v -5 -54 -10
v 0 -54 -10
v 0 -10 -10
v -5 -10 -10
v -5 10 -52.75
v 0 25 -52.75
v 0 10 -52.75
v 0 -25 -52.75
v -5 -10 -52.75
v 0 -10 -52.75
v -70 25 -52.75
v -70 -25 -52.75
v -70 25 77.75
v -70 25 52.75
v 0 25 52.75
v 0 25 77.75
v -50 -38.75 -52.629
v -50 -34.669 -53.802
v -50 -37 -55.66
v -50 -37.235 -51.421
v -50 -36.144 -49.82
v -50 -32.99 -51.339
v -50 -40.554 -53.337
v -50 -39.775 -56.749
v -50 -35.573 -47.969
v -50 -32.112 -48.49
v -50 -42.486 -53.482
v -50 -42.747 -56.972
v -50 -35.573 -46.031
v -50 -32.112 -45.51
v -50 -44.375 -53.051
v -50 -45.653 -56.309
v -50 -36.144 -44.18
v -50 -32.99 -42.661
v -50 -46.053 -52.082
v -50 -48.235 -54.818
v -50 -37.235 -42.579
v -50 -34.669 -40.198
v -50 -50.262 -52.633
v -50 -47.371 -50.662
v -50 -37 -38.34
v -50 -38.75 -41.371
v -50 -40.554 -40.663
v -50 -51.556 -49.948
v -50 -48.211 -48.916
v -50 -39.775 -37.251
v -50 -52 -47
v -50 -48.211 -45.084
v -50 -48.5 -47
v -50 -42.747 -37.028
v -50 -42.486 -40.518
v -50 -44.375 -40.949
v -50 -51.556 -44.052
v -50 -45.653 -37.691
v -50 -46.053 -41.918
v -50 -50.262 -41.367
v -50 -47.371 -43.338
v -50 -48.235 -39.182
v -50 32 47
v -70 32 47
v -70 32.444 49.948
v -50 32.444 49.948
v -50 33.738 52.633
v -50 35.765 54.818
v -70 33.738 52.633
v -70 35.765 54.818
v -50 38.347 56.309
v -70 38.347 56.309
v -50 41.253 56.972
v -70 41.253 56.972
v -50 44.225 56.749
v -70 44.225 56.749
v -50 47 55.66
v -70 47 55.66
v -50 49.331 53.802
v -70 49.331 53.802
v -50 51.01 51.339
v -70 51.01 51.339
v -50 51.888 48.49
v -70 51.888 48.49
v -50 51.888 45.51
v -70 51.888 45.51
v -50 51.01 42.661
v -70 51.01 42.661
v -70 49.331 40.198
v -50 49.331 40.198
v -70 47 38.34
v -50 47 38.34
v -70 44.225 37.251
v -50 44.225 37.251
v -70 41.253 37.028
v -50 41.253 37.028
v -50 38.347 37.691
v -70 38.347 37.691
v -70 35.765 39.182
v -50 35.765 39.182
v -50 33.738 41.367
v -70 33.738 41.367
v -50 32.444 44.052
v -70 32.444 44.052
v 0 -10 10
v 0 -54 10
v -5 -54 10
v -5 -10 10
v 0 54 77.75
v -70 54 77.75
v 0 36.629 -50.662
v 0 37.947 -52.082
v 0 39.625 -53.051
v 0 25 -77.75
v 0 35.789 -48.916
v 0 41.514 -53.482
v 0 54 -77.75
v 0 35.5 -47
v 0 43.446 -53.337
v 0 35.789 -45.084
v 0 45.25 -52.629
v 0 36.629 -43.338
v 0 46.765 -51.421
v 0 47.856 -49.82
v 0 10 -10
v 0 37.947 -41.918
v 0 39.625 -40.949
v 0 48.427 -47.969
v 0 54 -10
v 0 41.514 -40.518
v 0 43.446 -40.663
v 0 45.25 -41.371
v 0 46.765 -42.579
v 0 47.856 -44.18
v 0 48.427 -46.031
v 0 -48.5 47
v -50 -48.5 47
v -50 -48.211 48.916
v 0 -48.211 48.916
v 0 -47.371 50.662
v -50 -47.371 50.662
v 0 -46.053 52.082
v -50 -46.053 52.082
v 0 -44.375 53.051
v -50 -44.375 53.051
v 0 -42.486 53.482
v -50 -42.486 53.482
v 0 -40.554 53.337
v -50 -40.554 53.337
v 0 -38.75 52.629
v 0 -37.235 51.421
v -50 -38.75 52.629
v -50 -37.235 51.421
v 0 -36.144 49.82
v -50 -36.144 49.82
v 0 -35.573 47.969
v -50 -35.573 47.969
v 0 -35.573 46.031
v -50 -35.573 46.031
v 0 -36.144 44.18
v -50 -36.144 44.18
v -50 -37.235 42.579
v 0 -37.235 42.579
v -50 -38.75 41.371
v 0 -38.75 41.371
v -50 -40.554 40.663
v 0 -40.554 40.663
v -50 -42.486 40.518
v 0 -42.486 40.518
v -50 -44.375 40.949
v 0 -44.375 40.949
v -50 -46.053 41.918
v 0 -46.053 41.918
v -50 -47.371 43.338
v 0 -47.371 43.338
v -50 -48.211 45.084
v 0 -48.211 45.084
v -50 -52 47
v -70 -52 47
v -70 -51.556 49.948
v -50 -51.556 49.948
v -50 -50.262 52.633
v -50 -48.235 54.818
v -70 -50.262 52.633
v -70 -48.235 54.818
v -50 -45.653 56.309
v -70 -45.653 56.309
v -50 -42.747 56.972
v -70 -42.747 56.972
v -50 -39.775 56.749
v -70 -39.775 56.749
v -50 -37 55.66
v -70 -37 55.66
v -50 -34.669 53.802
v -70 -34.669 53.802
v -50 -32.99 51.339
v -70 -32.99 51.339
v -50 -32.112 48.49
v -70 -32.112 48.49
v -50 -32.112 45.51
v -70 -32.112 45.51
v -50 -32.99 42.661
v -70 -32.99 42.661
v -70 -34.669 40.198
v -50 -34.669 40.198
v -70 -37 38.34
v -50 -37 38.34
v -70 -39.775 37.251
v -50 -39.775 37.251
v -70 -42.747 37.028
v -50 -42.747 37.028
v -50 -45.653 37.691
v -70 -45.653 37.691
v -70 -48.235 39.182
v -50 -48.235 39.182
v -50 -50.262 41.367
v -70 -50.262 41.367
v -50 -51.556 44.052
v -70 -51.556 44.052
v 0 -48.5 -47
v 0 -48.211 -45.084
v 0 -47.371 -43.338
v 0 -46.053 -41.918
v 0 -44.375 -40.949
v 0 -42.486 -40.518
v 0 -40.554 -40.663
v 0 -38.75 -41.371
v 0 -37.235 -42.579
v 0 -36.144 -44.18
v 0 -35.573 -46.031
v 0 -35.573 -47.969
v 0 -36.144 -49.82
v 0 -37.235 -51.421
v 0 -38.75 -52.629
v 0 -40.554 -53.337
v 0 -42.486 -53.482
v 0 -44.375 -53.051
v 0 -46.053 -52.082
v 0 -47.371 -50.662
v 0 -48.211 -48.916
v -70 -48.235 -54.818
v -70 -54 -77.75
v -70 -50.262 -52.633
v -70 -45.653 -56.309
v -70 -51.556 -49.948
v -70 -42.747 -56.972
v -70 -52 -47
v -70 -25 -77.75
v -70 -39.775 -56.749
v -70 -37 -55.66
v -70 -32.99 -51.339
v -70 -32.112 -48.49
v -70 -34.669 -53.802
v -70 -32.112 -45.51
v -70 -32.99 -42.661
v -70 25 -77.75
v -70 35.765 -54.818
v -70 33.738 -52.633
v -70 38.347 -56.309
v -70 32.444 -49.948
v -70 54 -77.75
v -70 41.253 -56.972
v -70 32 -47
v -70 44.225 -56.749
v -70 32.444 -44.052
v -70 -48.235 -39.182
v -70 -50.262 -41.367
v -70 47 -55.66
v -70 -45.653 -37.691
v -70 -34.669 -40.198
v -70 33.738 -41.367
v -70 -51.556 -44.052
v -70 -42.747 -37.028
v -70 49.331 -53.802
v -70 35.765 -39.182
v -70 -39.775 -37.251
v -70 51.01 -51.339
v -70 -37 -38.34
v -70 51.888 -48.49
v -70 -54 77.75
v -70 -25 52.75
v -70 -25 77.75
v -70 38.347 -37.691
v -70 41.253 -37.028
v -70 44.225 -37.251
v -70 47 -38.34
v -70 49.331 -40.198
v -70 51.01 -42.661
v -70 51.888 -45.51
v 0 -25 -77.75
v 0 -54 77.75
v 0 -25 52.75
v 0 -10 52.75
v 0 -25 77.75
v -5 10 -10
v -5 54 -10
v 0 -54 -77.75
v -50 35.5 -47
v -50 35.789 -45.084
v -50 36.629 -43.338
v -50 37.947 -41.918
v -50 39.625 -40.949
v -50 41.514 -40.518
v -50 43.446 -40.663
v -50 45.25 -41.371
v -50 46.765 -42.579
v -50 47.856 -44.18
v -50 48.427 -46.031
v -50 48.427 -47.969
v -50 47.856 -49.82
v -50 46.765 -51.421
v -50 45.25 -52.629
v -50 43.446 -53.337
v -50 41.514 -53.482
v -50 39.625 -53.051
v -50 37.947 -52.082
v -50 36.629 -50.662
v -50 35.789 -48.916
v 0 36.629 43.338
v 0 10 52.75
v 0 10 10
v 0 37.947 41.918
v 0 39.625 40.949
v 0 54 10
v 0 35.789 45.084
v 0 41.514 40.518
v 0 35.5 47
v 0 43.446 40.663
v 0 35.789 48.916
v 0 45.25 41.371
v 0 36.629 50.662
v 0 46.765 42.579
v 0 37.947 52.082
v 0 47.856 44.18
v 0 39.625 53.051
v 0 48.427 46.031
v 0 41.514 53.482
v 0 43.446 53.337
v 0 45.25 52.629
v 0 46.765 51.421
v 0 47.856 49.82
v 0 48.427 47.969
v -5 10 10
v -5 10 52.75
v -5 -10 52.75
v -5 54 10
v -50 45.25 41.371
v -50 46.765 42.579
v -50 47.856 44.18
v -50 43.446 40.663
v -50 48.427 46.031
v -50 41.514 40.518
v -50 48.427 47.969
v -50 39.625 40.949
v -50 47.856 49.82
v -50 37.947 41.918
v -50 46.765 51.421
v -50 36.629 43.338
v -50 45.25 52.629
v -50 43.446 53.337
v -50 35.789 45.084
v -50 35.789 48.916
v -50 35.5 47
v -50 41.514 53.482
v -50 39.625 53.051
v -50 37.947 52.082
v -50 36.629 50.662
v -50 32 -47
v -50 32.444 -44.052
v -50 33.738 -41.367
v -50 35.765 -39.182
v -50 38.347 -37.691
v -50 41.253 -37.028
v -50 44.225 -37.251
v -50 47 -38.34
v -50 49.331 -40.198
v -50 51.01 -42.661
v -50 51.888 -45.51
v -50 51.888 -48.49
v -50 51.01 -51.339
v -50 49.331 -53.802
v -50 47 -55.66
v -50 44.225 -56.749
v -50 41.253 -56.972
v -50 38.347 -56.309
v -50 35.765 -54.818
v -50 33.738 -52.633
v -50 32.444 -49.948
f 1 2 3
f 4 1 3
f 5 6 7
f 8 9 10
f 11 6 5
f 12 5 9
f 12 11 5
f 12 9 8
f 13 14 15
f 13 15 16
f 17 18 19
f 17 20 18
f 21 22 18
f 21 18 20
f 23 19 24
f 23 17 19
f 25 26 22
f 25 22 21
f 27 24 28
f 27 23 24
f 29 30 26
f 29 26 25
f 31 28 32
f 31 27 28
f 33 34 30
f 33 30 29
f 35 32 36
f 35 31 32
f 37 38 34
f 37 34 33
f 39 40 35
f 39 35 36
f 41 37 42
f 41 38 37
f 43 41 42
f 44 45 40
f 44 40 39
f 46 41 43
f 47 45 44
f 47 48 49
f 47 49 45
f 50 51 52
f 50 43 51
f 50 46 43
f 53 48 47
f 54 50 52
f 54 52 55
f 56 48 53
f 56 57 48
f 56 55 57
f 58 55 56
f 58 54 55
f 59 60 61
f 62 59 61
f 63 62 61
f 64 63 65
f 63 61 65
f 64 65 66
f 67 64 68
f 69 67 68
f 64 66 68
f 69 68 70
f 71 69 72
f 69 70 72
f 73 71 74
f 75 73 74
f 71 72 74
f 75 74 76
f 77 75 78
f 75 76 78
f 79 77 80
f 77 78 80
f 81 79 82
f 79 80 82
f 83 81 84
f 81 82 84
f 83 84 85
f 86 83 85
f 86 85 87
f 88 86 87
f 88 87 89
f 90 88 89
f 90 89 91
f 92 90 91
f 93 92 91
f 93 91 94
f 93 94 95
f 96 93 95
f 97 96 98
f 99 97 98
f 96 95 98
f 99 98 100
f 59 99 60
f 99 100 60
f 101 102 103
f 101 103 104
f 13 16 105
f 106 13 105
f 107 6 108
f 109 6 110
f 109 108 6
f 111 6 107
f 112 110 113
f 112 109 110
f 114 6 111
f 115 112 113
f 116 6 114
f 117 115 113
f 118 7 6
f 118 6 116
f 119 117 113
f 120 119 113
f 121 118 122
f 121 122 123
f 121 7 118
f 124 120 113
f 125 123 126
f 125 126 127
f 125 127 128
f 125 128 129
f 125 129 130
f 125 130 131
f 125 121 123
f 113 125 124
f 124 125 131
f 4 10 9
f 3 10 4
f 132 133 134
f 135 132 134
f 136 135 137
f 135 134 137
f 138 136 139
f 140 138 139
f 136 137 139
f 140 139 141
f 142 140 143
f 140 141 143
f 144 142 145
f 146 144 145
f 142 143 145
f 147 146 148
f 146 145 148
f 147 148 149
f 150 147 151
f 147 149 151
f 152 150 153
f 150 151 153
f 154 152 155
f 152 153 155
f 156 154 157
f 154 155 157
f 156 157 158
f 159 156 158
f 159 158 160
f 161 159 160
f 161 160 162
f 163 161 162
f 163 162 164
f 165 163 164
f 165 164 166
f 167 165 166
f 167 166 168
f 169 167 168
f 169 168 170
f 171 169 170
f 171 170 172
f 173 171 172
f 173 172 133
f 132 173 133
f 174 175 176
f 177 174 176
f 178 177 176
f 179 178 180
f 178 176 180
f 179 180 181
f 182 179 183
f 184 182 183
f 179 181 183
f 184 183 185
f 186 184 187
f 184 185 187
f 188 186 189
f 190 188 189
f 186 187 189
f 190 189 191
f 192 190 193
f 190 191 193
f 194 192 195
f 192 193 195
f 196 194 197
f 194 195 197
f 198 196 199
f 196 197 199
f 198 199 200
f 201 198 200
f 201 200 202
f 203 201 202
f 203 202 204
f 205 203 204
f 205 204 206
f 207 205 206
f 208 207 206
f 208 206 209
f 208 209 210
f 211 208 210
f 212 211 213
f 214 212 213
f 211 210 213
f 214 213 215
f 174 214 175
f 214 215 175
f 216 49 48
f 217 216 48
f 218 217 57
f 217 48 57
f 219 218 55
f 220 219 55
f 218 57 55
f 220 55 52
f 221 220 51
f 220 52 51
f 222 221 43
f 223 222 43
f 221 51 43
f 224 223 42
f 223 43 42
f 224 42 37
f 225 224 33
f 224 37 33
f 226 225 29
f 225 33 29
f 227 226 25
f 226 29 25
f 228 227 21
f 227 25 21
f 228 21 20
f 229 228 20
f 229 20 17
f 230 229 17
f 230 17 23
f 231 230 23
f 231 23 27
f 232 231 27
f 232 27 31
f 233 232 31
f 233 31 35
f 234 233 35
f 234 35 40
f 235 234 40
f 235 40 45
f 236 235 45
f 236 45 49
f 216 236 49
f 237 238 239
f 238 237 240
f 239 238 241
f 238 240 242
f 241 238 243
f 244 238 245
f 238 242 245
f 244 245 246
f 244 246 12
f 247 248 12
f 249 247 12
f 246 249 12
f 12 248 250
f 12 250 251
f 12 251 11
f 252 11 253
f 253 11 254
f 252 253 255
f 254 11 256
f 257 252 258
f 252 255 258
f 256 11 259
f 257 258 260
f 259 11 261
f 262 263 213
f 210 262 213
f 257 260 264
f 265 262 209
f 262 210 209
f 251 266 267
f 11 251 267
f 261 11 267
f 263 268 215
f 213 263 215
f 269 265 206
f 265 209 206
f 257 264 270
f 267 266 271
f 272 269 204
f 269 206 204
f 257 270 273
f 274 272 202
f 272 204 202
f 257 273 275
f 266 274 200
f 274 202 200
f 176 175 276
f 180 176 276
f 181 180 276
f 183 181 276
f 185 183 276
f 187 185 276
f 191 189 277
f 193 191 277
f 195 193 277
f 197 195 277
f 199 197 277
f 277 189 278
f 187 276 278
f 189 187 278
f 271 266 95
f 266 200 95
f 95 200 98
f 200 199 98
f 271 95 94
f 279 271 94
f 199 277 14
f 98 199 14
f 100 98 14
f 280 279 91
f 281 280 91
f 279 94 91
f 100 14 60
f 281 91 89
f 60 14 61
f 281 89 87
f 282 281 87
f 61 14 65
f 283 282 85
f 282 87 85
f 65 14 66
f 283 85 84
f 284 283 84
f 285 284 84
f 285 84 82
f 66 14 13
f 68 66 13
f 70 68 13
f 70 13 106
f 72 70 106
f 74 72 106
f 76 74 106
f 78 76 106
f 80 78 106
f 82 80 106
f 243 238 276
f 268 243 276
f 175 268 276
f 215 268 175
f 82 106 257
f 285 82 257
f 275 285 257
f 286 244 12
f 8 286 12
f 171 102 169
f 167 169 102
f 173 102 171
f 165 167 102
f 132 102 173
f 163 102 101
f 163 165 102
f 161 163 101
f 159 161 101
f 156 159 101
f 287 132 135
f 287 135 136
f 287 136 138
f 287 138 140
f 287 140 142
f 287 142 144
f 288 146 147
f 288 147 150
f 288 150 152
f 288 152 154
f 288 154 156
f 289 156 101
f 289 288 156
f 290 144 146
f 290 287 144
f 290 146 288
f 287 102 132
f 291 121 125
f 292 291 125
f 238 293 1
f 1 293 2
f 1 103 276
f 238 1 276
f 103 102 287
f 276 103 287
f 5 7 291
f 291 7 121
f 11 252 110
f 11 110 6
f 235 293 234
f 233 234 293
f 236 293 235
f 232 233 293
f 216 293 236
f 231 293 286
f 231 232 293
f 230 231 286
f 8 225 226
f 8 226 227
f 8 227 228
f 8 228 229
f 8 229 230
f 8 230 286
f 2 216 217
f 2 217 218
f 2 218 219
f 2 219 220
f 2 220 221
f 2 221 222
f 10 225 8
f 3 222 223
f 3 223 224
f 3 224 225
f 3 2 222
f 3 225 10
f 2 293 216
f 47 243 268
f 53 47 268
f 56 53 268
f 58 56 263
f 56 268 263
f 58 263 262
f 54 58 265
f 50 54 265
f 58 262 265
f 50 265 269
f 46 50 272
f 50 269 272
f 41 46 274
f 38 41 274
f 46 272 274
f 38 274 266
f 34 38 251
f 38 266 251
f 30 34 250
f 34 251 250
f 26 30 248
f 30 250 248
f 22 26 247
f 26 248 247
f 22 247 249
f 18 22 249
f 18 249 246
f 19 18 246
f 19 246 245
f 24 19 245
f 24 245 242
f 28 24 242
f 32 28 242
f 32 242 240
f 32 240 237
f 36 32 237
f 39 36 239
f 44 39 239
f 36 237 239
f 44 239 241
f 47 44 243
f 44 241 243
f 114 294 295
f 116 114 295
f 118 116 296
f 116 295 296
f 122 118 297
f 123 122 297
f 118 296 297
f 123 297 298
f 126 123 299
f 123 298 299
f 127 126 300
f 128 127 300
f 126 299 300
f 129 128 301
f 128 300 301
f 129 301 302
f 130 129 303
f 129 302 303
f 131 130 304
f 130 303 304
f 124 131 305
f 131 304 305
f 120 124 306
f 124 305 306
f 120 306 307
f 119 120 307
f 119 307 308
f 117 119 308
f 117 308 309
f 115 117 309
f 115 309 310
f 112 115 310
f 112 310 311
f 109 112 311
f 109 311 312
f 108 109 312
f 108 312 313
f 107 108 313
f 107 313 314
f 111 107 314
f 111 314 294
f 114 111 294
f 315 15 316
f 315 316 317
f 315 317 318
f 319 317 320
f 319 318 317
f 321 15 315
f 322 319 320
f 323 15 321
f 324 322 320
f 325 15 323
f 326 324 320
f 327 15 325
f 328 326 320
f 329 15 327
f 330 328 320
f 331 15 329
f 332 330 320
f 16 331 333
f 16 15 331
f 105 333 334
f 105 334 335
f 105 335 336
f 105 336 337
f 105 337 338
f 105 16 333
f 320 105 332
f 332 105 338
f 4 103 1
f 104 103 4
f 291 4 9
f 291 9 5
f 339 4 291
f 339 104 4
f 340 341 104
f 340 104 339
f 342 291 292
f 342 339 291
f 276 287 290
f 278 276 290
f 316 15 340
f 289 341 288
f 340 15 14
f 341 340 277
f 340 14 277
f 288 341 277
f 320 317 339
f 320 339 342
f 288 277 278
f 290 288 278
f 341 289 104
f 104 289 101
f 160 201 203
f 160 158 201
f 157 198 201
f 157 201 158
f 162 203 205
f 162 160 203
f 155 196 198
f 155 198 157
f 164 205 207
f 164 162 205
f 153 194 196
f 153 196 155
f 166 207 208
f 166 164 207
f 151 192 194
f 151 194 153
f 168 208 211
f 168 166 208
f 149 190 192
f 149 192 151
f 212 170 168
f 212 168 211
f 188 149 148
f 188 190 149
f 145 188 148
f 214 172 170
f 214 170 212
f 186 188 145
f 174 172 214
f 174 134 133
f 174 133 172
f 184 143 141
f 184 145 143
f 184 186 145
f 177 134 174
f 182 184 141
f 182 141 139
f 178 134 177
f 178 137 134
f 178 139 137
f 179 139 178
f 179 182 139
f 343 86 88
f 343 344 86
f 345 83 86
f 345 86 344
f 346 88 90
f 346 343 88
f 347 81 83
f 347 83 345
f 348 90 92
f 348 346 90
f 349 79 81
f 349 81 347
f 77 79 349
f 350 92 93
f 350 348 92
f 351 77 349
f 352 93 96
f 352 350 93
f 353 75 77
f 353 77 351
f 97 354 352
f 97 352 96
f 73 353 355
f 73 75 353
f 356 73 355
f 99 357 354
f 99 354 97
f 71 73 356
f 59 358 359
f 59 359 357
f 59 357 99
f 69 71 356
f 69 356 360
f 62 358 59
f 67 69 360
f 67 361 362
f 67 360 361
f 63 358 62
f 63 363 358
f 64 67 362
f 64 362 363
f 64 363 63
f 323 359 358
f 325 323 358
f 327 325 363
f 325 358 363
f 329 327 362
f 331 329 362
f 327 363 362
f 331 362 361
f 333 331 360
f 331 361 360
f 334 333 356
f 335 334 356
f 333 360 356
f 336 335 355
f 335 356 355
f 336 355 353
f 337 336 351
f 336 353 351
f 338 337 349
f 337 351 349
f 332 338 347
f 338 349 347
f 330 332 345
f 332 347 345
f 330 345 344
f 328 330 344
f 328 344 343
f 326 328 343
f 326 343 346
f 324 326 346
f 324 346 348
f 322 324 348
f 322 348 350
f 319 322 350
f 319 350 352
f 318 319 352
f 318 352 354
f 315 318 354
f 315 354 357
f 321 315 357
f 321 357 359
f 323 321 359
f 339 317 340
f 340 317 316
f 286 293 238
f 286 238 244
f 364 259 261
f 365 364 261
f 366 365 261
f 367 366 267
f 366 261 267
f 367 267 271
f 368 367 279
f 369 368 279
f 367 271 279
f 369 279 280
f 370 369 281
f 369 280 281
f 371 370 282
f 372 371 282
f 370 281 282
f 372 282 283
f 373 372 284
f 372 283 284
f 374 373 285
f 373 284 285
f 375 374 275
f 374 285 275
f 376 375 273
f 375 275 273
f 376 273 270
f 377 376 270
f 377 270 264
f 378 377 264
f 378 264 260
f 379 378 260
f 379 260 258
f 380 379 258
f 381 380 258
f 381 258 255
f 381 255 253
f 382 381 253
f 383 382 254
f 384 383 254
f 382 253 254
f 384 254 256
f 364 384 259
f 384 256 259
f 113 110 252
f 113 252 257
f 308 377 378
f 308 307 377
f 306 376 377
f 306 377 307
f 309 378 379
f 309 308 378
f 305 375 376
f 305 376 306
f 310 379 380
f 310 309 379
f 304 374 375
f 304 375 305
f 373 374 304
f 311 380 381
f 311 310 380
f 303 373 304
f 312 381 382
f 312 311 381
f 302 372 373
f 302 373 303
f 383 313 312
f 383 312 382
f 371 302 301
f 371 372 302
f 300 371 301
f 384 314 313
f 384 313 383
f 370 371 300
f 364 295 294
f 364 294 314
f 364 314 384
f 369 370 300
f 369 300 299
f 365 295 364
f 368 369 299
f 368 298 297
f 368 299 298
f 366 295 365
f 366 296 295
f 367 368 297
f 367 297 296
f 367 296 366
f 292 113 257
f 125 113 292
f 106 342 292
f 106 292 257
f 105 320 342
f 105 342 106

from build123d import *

# Parameters (mm, degrees)
F0_W     = 108
F0_H     = 155.5
F1_DEPTH = 70
F2_R     = 6.5
F3_DEPTH = 70.001
F4_W     = 50
F4_H     = 25
F5_DEPTH = 70.001
F6_R     = 10
F7_DEPTH = 20
F8_W     = 20
F8_H     = 42.75
F8_H_2   = 20
F8_W_2   = 44
F9_DEPTH = 5


with BuildPart() as f1:
    # F0 (on Right) → F1 (new body)
    with BuildSketch(Plane.YZ):
        Rectangle(F0_W, F0_H)
    extrude(amount=-F1_DEPTH)

    # F2 (on face) → F3 (cut, through all)
    with BuildSketch(Plane(origin=(-70, 0, 0), x_dir=(0, -1, 0), z_dir=(-1, 0, 0))):
        with Locations((-42, 47)):
            Circle(F2_R)
        with Locations((42, 47)):
            Circle(F2_R)
        with Locations((-42, -47)):
            Circle(F2_R)
        with Locations((42, -47)):
            Circle(F2_R)
    extrude(amount=-F3_DEPTH, mode=Mode.SUBTRACT)

    # F4 (on face) → F5 (cut, through all)
    with BuildSketch(Plane(origin=(-70, 0, 0), x_dir=(0, -1, 0), z_dir=(-1, 0, 0))):
        with Locations((0, 65.25)):
            Rectangle(F4_W, F4_H)
        with Locations((0, -65.25)):
            Rectangle(F4_W, F4_H)
    extrude(amount=-F5_DEPTH, mode=Mode.SUBTRACT)

    # F6 (on face) → F7 (cut)
    with BuildSketch(Plane(origin=(-70, 0, 0), x_dir=(0, -1, 0), z_dir=(-1, 0, 0))):
        with Locations((-42, 47)):
            Circle(F6_R)
        with Locations((-42, -47)):
            Circle(F6_R)
        with Locations((42, 47)):
            Circle(F6_R)
        with Locations((42, -47)):
            Circle(F6_R)
    extrude(amount=-F7_DEPTH, mode=Mode.SUBTRACT)

    # F8 (on face) → F9 (cut)
    with BuildSketch(Plane.YZ):
        with Locations((0, 31.375)):
            Rectangle(F8_W, F8_H)
        Rectangle(F8_W, F8_H_2)
        with Locations((-32, 0)):
            Rectangle(F8_W_2, F8_H_2)
        with Locations((32, 0)):
            Rectangle(F8_W_2, F8_H_2)
        with Locations((0, -31.375)):
            Rectangle(F8_W, F8_H)
    extrude(amount=-F9_DEPTH, mode=Mode.SUBTRACT)


solid = f1.part
